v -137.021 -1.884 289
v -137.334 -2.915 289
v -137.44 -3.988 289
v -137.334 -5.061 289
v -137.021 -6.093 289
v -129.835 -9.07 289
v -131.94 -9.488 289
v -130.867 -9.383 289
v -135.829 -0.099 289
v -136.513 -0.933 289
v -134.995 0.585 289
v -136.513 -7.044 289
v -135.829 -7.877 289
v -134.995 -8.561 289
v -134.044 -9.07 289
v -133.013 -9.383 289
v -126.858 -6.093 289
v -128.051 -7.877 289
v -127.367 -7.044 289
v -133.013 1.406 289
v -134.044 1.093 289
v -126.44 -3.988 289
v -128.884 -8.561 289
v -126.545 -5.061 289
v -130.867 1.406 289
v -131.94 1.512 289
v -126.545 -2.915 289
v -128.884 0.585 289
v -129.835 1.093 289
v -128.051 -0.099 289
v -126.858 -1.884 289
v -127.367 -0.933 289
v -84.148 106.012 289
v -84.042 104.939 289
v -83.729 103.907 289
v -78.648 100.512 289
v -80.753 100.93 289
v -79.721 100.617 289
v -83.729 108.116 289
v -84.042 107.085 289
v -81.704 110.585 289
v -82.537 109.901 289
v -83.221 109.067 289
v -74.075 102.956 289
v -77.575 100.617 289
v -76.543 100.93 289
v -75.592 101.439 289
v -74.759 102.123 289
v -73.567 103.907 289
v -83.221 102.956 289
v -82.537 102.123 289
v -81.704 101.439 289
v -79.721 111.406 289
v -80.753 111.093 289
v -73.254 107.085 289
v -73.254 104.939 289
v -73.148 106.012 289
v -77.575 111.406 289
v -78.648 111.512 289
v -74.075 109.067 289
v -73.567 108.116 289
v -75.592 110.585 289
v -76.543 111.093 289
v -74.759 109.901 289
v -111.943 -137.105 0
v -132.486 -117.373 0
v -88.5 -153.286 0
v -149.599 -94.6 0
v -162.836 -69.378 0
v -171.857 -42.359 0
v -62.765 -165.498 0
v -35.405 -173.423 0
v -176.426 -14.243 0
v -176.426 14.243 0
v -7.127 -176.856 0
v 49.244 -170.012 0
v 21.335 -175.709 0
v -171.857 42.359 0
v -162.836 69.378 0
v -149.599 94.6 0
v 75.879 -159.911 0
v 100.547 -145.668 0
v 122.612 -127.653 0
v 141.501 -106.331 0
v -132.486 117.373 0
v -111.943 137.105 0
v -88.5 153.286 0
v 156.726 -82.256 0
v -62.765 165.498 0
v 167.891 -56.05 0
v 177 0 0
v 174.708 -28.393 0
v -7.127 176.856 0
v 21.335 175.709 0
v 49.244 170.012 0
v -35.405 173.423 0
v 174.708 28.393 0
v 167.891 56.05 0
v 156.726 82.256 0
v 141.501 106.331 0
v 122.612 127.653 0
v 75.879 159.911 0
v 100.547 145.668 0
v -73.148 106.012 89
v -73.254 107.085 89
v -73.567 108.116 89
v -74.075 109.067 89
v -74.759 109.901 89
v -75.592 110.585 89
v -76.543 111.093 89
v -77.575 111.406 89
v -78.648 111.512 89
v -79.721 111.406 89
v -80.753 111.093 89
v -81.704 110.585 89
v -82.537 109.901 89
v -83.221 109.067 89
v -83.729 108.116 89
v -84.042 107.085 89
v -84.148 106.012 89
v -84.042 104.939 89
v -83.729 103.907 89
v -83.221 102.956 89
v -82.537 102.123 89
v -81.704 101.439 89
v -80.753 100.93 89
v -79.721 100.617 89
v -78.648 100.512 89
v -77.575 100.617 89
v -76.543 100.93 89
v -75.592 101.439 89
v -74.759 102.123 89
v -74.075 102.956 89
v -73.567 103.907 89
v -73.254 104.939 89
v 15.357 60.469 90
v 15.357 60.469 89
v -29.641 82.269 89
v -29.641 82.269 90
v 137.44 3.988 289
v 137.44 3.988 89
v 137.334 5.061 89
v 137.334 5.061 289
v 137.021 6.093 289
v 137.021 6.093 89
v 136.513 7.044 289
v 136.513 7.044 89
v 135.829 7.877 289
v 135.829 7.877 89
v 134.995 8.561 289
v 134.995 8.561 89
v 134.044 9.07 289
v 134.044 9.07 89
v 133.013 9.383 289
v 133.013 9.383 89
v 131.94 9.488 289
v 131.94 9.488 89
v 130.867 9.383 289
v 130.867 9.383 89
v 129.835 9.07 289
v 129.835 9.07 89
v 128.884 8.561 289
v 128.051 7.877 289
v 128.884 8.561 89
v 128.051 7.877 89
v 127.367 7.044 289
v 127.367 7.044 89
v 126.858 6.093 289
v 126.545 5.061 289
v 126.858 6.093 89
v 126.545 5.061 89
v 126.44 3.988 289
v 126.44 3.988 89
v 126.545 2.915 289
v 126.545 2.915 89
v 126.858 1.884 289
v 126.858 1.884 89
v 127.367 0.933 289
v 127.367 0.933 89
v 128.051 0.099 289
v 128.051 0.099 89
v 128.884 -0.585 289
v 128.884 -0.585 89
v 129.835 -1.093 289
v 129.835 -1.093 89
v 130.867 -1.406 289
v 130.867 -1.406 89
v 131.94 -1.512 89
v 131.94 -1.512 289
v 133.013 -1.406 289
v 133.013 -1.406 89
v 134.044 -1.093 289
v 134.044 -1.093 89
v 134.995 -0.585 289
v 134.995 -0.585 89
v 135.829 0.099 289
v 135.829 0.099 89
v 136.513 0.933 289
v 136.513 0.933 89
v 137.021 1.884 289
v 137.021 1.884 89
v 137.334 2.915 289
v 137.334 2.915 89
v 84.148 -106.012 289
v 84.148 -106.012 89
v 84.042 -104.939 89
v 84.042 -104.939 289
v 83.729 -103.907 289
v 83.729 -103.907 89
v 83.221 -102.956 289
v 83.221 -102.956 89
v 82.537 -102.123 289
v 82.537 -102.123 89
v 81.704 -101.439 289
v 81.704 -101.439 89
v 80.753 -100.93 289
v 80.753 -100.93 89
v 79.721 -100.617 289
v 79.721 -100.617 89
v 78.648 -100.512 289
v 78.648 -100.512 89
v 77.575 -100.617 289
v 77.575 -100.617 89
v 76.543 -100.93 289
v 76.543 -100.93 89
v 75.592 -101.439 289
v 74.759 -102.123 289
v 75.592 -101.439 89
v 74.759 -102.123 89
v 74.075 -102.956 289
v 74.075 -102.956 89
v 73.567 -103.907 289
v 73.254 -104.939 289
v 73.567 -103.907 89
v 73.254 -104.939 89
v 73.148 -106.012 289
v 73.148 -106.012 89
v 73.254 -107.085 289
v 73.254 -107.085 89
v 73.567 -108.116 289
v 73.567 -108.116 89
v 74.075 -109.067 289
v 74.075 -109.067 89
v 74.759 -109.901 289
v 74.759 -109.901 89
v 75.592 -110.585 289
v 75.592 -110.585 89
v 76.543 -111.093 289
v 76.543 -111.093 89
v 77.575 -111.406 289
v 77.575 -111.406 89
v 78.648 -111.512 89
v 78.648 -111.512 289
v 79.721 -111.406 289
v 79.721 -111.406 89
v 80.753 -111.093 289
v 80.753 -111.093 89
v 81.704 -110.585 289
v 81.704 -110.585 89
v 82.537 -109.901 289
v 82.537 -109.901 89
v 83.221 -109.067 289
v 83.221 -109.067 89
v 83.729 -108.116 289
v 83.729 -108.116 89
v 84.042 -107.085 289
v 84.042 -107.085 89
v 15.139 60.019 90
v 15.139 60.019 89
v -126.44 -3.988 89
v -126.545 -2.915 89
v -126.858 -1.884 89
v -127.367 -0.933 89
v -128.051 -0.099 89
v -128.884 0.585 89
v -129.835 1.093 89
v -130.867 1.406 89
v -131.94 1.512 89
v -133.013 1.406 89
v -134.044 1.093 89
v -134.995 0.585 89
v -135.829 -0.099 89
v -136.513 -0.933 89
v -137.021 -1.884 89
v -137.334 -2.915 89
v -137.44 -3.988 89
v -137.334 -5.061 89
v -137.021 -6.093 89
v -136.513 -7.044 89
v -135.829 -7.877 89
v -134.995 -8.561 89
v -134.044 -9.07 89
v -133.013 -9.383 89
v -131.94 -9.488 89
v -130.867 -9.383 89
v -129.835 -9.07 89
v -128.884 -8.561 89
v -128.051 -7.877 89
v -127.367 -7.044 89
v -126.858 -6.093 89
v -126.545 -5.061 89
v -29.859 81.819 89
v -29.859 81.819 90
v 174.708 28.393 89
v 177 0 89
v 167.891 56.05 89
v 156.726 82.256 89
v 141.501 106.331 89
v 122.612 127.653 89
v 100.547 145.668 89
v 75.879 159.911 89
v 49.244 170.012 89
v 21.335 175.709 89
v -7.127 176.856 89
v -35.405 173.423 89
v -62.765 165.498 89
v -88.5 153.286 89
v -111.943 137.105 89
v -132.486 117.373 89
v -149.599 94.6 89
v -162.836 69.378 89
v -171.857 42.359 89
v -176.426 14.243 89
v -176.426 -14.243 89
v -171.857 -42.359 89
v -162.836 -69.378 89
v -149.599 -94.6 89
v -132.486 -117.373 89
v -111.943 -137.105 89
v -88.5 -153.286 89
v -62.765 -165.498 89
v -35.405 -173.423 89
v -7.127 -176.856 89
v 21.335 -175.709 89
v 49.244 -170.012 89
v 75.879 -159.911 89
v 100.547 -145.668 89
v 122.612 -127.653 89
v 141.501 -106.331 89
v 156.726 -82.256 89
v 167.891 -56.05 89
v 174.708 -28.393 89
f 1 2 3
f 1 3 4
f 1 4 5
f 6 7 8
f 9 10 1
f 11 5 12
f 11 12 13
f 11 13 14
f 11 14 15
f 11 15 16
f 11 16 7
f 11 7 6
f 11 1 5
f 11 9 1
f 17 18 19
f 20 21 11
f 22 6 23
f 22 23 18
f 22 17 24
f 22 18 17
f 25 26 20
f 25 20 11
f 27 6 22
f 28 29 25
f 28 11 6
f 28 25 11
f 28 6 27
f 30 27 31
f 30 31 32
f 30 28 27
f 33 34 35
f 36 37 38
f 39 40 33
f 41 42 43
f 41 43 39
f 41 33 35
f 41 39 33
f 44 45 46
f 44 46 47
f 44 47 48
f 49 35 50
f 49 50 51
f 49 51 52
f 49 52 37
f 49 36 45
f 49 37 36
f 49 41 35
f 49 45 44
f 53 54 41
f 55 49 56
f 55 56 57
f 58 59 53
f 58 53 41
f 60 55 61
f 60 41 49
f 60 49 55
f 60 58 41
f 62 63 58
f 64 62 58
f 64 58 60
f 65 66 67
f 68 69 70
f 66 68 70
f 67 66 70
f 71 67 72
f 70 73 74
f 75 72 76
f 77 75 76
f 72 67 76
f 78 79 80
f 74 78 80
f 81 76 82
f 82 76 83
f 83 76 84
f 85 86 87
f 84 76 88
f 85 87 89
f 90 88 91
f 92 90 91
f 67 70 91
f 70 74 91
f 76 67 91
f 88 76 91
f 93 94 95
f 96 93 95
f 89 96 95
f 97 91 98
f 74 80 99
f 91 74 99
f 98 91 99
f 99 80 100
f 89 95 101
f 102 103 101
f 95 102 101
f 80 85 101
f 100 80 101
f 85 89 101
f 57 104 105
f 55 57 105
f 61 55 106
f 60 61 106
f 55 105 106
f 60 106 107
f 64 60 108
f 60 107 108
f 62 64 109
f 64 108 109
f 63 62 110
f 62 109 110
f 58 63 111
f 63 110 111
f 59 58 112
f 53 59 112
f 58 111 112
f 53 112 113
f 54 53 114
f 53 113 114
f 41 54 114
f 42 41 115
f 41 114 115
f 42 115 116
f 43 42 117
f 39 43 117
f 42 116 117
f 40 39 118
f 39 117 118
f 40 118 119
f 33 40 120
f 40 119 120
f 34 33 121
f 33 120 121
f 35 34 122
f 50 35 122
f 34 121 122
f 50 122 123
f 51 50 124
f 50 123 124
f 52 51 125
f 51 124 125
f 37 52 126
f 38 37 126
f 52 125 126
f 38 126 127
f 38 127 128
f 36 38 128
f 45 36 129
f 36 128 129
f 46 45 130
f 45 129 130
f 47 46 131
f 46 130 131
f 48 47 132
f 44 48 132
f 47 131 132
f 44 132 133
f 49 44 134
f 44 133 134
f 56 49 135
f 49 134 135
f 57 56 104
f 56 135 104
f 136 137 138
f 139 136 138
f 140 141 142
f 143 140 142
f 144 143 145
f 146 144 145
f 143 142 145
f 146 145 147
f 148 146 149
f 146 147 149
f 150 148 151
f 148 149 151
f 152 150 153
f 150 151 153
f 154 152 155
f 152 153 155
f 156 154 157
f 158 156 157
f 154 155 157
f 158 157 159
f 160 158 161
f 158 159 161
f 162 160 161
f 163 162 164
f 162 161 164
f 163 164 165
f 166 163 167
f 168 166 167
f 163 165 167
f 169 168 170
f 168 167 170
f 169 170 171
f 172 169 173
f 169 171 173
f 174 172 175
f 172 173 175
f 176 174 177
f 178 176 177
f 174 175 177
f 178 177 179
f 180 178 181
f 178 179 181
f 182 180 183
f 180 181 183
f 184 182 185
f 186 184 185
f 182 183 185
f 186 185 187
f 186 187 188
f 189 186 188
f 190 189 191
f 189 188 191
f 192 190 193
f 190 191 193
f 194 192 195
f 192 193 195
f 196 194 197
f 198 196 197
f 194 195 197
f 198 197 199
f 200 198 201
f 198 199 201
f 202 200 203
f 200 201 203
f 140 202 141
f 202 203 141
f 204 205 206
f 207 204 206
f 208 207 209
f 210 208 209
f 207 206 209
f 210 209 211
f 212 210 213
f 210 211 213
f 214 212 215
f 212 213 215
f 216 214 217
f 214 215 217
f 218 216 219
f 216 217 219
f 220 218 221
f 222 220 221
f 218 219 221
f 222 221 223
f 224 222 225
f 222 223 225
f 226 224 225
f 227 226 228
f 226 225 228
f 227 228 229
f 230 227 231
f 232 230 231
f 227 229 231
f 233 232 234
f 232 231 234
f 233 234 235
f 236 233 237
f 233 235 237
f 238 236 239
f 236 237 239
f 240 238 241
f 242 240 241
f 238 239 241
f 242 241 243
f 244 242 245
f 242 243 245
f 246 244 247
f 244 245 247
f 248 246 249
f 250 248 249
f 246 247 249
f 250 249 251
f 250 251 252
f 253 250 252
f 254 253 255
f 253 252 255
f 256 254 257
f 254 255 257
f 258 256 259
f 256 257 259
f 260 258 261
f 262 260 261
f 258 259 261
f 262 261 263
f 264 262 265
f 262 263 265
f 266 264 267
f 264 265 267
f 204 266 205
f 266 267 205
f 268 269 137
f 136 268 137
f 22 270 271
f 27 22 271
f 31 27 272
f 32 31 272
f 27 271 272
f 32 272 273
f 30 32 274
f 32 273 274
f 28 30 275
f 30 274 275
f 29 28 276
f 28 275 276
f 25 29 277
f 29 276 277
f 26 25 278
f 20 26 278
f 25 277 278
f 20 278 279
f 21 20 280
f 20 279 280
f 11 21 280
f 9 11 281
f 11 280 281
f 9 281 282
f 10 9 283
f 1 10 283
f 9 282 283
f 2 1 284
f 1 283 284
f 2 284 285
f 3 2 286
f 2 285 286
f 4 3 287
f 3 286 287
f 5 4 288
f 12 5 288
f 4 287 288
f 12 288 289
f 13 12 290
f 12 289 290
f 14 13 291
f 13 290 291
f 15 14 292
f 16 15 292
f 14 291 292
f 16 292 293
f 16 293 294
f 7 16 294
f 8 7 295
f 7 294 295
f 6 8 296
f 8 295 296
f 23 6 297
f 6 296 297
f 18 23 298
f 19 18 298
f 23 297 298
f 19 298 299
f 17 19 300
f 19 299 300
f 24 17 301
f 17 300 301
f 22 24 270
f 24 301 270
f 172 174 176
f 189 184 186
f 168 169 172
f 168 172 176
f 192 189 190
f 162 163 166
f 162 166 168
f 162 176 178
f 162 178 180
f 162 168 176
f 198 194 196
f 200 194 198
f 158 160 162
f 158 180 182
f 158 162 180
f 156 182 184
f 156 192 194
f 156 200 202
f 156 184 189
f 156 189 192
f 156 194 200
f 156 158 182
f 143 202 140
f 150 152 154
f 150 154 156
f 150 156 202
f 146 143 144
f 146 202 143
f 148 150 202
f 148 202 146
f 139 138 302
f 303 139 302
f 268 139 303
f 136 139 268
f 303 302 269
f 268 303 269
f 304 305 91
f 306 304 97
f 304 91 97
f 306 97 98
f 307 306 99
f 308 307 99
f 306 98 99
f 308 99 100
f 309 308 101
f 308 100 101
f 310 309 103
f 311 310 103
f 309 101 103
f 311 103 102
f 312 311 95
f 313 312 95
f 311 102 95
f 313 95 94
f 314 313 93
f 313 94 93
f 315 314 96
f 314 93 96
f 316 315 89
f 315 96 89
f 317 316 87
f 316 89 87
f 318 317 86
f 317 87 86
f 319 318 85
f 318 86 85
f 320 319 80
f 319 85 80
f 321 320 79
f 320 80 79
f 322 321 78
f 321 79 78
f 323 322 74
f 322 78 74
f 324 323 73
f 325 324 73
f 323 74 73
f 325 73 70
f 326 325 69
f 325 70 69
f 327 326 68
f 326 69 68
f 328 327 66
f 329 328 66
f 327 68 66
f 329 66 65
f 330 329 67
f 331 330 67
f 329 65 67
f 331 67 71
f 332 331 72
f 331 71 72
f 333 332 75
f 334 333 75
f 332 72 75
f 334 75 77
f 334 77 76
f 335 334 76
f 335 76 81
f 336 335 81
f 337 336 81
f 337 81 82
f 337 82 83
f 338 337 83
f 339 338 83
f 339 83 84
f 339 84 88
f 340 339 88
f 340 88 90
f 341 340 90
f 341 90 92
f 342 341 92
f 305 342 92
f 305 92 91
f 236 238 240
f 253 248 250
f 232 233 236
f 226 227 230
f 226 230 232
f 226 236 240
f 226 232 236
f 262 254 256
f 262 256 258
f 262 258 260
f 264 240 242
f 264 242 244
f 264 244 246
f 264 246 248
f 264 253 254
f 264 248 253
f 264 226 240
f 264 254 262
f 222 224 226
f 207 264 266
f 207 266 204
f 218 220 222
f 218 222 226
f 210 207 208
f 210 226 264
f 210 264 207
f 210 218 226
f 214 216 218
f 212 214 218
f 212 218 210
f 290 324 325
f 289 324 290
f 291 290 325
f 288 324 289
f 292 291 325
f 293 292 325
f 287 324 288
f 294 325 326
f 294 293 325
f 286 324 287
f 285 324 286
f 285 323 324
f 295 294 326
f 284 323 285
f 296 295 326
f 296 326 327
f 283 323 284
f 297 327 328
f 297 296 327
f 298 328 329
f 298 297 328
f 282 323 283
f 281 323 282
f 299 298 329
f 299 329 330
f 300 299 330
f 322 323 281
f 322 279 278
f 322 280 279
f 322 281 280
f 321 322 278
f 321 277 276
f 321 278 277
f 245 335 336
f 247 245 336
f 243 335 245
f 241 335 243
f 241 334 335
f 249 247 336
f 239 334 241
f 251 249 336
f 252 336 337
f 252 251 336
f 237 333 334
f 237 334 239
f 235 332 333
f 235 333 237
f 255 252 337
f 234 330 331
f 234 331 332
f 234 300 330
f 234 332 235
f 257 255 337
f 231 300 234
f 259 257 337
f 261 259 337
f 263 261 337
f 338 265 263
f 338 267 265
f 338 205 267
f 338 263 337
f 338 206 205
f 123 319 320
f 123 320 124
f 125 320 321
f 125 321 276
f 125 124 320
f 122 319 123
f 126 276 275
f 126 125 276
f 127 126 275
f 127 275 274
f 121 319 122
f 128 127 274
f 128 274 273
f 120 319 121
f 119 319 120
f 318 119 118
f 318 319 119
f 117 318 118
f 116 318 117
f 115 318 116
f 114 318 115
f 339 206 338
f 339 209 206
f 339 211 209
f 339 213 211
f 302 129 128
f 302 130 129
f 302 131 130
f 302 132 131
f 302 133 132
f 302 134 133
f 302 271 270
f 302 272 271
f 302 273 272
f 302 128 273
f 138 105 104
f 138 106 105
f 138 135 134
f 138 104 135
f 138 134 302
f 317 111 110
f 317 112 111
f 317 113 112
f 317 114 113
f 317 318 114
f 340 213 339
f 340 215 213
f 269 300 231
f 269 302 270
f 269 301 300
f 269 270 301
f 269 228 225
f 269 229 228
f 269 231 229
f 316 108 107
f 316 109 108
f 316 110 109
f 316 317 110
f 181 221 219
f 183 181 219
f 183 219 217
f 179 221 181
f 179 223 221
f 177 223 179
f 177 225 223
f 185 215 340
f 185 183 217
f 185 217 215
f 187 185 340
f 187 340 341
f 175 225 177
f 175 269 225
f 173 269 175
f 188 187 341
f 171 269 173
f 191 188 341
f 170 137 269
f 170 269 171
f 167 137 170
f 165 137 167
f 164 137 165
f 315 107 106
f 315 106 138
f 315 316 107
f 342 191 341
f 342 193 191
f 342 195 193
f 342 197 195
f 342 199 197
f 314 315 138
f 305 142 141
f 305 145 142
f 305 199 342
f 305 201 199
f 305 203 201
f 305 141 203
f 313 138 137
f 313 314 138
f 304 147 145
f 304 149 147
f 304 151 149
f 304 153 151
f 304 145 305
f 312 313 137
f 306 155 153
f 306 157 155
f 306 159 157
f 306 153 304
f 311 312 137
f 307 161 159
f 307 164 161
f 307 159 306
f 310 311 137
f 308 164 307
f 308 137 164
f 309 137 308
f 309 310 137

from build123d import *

# Parameters (mm, degrees)
ESQUISSE1_R        = 177
BOSS_EXTRU_1_DEPTH = 89
ESQUISSE2_R        = 5.5
BOSS_EXTRU_2_DEPTH = 200
BOSS_EXTRU_4_DEPTH = 1


with BuildPart() as part:
    # Esquisse1 → Boss.-Extru.1 (new body)
    with BuildSketch(Plane.XY):
        Circle(ESQUISSE1_R)
    extrude(amount=BOSS_EXTRU_1_DEPTH)

    # Esquisse2 → Boss.-Extru.2 (add)
    with BuildSketch(Plane.XY.offset(89)):
        with Locations((-131.939733982, -3.988307506)):
            Circle(ESQUISSE2_R)
        with Locations((78.648083604, -106.011692494)):
            Circle(ESQUISSE2_R)
        with Locations((131.939733982, 3.988307506)):
            Circle(ESQUISSE2_R)
        with Locations((-78.648083604, 106.011692494)):
            Circle(ESQUISSE2_R)
    extrude(amount=BOSS_EXTRU_2_DEPTH)

    # Esquisse4 → Boss.-Extru.4 (add)
    with BuildSketch(Plane.XY.offset(89)):
        Polygon((-29.640529762, 82.269024992), (-29.858528448, 81.819051023), (15.138868472, 60.019182436), (15.356867158, 60.469156405), align=None)
    extrude(amount=BOSS_EXTRU_4_DEPTH)


solid = part.part
